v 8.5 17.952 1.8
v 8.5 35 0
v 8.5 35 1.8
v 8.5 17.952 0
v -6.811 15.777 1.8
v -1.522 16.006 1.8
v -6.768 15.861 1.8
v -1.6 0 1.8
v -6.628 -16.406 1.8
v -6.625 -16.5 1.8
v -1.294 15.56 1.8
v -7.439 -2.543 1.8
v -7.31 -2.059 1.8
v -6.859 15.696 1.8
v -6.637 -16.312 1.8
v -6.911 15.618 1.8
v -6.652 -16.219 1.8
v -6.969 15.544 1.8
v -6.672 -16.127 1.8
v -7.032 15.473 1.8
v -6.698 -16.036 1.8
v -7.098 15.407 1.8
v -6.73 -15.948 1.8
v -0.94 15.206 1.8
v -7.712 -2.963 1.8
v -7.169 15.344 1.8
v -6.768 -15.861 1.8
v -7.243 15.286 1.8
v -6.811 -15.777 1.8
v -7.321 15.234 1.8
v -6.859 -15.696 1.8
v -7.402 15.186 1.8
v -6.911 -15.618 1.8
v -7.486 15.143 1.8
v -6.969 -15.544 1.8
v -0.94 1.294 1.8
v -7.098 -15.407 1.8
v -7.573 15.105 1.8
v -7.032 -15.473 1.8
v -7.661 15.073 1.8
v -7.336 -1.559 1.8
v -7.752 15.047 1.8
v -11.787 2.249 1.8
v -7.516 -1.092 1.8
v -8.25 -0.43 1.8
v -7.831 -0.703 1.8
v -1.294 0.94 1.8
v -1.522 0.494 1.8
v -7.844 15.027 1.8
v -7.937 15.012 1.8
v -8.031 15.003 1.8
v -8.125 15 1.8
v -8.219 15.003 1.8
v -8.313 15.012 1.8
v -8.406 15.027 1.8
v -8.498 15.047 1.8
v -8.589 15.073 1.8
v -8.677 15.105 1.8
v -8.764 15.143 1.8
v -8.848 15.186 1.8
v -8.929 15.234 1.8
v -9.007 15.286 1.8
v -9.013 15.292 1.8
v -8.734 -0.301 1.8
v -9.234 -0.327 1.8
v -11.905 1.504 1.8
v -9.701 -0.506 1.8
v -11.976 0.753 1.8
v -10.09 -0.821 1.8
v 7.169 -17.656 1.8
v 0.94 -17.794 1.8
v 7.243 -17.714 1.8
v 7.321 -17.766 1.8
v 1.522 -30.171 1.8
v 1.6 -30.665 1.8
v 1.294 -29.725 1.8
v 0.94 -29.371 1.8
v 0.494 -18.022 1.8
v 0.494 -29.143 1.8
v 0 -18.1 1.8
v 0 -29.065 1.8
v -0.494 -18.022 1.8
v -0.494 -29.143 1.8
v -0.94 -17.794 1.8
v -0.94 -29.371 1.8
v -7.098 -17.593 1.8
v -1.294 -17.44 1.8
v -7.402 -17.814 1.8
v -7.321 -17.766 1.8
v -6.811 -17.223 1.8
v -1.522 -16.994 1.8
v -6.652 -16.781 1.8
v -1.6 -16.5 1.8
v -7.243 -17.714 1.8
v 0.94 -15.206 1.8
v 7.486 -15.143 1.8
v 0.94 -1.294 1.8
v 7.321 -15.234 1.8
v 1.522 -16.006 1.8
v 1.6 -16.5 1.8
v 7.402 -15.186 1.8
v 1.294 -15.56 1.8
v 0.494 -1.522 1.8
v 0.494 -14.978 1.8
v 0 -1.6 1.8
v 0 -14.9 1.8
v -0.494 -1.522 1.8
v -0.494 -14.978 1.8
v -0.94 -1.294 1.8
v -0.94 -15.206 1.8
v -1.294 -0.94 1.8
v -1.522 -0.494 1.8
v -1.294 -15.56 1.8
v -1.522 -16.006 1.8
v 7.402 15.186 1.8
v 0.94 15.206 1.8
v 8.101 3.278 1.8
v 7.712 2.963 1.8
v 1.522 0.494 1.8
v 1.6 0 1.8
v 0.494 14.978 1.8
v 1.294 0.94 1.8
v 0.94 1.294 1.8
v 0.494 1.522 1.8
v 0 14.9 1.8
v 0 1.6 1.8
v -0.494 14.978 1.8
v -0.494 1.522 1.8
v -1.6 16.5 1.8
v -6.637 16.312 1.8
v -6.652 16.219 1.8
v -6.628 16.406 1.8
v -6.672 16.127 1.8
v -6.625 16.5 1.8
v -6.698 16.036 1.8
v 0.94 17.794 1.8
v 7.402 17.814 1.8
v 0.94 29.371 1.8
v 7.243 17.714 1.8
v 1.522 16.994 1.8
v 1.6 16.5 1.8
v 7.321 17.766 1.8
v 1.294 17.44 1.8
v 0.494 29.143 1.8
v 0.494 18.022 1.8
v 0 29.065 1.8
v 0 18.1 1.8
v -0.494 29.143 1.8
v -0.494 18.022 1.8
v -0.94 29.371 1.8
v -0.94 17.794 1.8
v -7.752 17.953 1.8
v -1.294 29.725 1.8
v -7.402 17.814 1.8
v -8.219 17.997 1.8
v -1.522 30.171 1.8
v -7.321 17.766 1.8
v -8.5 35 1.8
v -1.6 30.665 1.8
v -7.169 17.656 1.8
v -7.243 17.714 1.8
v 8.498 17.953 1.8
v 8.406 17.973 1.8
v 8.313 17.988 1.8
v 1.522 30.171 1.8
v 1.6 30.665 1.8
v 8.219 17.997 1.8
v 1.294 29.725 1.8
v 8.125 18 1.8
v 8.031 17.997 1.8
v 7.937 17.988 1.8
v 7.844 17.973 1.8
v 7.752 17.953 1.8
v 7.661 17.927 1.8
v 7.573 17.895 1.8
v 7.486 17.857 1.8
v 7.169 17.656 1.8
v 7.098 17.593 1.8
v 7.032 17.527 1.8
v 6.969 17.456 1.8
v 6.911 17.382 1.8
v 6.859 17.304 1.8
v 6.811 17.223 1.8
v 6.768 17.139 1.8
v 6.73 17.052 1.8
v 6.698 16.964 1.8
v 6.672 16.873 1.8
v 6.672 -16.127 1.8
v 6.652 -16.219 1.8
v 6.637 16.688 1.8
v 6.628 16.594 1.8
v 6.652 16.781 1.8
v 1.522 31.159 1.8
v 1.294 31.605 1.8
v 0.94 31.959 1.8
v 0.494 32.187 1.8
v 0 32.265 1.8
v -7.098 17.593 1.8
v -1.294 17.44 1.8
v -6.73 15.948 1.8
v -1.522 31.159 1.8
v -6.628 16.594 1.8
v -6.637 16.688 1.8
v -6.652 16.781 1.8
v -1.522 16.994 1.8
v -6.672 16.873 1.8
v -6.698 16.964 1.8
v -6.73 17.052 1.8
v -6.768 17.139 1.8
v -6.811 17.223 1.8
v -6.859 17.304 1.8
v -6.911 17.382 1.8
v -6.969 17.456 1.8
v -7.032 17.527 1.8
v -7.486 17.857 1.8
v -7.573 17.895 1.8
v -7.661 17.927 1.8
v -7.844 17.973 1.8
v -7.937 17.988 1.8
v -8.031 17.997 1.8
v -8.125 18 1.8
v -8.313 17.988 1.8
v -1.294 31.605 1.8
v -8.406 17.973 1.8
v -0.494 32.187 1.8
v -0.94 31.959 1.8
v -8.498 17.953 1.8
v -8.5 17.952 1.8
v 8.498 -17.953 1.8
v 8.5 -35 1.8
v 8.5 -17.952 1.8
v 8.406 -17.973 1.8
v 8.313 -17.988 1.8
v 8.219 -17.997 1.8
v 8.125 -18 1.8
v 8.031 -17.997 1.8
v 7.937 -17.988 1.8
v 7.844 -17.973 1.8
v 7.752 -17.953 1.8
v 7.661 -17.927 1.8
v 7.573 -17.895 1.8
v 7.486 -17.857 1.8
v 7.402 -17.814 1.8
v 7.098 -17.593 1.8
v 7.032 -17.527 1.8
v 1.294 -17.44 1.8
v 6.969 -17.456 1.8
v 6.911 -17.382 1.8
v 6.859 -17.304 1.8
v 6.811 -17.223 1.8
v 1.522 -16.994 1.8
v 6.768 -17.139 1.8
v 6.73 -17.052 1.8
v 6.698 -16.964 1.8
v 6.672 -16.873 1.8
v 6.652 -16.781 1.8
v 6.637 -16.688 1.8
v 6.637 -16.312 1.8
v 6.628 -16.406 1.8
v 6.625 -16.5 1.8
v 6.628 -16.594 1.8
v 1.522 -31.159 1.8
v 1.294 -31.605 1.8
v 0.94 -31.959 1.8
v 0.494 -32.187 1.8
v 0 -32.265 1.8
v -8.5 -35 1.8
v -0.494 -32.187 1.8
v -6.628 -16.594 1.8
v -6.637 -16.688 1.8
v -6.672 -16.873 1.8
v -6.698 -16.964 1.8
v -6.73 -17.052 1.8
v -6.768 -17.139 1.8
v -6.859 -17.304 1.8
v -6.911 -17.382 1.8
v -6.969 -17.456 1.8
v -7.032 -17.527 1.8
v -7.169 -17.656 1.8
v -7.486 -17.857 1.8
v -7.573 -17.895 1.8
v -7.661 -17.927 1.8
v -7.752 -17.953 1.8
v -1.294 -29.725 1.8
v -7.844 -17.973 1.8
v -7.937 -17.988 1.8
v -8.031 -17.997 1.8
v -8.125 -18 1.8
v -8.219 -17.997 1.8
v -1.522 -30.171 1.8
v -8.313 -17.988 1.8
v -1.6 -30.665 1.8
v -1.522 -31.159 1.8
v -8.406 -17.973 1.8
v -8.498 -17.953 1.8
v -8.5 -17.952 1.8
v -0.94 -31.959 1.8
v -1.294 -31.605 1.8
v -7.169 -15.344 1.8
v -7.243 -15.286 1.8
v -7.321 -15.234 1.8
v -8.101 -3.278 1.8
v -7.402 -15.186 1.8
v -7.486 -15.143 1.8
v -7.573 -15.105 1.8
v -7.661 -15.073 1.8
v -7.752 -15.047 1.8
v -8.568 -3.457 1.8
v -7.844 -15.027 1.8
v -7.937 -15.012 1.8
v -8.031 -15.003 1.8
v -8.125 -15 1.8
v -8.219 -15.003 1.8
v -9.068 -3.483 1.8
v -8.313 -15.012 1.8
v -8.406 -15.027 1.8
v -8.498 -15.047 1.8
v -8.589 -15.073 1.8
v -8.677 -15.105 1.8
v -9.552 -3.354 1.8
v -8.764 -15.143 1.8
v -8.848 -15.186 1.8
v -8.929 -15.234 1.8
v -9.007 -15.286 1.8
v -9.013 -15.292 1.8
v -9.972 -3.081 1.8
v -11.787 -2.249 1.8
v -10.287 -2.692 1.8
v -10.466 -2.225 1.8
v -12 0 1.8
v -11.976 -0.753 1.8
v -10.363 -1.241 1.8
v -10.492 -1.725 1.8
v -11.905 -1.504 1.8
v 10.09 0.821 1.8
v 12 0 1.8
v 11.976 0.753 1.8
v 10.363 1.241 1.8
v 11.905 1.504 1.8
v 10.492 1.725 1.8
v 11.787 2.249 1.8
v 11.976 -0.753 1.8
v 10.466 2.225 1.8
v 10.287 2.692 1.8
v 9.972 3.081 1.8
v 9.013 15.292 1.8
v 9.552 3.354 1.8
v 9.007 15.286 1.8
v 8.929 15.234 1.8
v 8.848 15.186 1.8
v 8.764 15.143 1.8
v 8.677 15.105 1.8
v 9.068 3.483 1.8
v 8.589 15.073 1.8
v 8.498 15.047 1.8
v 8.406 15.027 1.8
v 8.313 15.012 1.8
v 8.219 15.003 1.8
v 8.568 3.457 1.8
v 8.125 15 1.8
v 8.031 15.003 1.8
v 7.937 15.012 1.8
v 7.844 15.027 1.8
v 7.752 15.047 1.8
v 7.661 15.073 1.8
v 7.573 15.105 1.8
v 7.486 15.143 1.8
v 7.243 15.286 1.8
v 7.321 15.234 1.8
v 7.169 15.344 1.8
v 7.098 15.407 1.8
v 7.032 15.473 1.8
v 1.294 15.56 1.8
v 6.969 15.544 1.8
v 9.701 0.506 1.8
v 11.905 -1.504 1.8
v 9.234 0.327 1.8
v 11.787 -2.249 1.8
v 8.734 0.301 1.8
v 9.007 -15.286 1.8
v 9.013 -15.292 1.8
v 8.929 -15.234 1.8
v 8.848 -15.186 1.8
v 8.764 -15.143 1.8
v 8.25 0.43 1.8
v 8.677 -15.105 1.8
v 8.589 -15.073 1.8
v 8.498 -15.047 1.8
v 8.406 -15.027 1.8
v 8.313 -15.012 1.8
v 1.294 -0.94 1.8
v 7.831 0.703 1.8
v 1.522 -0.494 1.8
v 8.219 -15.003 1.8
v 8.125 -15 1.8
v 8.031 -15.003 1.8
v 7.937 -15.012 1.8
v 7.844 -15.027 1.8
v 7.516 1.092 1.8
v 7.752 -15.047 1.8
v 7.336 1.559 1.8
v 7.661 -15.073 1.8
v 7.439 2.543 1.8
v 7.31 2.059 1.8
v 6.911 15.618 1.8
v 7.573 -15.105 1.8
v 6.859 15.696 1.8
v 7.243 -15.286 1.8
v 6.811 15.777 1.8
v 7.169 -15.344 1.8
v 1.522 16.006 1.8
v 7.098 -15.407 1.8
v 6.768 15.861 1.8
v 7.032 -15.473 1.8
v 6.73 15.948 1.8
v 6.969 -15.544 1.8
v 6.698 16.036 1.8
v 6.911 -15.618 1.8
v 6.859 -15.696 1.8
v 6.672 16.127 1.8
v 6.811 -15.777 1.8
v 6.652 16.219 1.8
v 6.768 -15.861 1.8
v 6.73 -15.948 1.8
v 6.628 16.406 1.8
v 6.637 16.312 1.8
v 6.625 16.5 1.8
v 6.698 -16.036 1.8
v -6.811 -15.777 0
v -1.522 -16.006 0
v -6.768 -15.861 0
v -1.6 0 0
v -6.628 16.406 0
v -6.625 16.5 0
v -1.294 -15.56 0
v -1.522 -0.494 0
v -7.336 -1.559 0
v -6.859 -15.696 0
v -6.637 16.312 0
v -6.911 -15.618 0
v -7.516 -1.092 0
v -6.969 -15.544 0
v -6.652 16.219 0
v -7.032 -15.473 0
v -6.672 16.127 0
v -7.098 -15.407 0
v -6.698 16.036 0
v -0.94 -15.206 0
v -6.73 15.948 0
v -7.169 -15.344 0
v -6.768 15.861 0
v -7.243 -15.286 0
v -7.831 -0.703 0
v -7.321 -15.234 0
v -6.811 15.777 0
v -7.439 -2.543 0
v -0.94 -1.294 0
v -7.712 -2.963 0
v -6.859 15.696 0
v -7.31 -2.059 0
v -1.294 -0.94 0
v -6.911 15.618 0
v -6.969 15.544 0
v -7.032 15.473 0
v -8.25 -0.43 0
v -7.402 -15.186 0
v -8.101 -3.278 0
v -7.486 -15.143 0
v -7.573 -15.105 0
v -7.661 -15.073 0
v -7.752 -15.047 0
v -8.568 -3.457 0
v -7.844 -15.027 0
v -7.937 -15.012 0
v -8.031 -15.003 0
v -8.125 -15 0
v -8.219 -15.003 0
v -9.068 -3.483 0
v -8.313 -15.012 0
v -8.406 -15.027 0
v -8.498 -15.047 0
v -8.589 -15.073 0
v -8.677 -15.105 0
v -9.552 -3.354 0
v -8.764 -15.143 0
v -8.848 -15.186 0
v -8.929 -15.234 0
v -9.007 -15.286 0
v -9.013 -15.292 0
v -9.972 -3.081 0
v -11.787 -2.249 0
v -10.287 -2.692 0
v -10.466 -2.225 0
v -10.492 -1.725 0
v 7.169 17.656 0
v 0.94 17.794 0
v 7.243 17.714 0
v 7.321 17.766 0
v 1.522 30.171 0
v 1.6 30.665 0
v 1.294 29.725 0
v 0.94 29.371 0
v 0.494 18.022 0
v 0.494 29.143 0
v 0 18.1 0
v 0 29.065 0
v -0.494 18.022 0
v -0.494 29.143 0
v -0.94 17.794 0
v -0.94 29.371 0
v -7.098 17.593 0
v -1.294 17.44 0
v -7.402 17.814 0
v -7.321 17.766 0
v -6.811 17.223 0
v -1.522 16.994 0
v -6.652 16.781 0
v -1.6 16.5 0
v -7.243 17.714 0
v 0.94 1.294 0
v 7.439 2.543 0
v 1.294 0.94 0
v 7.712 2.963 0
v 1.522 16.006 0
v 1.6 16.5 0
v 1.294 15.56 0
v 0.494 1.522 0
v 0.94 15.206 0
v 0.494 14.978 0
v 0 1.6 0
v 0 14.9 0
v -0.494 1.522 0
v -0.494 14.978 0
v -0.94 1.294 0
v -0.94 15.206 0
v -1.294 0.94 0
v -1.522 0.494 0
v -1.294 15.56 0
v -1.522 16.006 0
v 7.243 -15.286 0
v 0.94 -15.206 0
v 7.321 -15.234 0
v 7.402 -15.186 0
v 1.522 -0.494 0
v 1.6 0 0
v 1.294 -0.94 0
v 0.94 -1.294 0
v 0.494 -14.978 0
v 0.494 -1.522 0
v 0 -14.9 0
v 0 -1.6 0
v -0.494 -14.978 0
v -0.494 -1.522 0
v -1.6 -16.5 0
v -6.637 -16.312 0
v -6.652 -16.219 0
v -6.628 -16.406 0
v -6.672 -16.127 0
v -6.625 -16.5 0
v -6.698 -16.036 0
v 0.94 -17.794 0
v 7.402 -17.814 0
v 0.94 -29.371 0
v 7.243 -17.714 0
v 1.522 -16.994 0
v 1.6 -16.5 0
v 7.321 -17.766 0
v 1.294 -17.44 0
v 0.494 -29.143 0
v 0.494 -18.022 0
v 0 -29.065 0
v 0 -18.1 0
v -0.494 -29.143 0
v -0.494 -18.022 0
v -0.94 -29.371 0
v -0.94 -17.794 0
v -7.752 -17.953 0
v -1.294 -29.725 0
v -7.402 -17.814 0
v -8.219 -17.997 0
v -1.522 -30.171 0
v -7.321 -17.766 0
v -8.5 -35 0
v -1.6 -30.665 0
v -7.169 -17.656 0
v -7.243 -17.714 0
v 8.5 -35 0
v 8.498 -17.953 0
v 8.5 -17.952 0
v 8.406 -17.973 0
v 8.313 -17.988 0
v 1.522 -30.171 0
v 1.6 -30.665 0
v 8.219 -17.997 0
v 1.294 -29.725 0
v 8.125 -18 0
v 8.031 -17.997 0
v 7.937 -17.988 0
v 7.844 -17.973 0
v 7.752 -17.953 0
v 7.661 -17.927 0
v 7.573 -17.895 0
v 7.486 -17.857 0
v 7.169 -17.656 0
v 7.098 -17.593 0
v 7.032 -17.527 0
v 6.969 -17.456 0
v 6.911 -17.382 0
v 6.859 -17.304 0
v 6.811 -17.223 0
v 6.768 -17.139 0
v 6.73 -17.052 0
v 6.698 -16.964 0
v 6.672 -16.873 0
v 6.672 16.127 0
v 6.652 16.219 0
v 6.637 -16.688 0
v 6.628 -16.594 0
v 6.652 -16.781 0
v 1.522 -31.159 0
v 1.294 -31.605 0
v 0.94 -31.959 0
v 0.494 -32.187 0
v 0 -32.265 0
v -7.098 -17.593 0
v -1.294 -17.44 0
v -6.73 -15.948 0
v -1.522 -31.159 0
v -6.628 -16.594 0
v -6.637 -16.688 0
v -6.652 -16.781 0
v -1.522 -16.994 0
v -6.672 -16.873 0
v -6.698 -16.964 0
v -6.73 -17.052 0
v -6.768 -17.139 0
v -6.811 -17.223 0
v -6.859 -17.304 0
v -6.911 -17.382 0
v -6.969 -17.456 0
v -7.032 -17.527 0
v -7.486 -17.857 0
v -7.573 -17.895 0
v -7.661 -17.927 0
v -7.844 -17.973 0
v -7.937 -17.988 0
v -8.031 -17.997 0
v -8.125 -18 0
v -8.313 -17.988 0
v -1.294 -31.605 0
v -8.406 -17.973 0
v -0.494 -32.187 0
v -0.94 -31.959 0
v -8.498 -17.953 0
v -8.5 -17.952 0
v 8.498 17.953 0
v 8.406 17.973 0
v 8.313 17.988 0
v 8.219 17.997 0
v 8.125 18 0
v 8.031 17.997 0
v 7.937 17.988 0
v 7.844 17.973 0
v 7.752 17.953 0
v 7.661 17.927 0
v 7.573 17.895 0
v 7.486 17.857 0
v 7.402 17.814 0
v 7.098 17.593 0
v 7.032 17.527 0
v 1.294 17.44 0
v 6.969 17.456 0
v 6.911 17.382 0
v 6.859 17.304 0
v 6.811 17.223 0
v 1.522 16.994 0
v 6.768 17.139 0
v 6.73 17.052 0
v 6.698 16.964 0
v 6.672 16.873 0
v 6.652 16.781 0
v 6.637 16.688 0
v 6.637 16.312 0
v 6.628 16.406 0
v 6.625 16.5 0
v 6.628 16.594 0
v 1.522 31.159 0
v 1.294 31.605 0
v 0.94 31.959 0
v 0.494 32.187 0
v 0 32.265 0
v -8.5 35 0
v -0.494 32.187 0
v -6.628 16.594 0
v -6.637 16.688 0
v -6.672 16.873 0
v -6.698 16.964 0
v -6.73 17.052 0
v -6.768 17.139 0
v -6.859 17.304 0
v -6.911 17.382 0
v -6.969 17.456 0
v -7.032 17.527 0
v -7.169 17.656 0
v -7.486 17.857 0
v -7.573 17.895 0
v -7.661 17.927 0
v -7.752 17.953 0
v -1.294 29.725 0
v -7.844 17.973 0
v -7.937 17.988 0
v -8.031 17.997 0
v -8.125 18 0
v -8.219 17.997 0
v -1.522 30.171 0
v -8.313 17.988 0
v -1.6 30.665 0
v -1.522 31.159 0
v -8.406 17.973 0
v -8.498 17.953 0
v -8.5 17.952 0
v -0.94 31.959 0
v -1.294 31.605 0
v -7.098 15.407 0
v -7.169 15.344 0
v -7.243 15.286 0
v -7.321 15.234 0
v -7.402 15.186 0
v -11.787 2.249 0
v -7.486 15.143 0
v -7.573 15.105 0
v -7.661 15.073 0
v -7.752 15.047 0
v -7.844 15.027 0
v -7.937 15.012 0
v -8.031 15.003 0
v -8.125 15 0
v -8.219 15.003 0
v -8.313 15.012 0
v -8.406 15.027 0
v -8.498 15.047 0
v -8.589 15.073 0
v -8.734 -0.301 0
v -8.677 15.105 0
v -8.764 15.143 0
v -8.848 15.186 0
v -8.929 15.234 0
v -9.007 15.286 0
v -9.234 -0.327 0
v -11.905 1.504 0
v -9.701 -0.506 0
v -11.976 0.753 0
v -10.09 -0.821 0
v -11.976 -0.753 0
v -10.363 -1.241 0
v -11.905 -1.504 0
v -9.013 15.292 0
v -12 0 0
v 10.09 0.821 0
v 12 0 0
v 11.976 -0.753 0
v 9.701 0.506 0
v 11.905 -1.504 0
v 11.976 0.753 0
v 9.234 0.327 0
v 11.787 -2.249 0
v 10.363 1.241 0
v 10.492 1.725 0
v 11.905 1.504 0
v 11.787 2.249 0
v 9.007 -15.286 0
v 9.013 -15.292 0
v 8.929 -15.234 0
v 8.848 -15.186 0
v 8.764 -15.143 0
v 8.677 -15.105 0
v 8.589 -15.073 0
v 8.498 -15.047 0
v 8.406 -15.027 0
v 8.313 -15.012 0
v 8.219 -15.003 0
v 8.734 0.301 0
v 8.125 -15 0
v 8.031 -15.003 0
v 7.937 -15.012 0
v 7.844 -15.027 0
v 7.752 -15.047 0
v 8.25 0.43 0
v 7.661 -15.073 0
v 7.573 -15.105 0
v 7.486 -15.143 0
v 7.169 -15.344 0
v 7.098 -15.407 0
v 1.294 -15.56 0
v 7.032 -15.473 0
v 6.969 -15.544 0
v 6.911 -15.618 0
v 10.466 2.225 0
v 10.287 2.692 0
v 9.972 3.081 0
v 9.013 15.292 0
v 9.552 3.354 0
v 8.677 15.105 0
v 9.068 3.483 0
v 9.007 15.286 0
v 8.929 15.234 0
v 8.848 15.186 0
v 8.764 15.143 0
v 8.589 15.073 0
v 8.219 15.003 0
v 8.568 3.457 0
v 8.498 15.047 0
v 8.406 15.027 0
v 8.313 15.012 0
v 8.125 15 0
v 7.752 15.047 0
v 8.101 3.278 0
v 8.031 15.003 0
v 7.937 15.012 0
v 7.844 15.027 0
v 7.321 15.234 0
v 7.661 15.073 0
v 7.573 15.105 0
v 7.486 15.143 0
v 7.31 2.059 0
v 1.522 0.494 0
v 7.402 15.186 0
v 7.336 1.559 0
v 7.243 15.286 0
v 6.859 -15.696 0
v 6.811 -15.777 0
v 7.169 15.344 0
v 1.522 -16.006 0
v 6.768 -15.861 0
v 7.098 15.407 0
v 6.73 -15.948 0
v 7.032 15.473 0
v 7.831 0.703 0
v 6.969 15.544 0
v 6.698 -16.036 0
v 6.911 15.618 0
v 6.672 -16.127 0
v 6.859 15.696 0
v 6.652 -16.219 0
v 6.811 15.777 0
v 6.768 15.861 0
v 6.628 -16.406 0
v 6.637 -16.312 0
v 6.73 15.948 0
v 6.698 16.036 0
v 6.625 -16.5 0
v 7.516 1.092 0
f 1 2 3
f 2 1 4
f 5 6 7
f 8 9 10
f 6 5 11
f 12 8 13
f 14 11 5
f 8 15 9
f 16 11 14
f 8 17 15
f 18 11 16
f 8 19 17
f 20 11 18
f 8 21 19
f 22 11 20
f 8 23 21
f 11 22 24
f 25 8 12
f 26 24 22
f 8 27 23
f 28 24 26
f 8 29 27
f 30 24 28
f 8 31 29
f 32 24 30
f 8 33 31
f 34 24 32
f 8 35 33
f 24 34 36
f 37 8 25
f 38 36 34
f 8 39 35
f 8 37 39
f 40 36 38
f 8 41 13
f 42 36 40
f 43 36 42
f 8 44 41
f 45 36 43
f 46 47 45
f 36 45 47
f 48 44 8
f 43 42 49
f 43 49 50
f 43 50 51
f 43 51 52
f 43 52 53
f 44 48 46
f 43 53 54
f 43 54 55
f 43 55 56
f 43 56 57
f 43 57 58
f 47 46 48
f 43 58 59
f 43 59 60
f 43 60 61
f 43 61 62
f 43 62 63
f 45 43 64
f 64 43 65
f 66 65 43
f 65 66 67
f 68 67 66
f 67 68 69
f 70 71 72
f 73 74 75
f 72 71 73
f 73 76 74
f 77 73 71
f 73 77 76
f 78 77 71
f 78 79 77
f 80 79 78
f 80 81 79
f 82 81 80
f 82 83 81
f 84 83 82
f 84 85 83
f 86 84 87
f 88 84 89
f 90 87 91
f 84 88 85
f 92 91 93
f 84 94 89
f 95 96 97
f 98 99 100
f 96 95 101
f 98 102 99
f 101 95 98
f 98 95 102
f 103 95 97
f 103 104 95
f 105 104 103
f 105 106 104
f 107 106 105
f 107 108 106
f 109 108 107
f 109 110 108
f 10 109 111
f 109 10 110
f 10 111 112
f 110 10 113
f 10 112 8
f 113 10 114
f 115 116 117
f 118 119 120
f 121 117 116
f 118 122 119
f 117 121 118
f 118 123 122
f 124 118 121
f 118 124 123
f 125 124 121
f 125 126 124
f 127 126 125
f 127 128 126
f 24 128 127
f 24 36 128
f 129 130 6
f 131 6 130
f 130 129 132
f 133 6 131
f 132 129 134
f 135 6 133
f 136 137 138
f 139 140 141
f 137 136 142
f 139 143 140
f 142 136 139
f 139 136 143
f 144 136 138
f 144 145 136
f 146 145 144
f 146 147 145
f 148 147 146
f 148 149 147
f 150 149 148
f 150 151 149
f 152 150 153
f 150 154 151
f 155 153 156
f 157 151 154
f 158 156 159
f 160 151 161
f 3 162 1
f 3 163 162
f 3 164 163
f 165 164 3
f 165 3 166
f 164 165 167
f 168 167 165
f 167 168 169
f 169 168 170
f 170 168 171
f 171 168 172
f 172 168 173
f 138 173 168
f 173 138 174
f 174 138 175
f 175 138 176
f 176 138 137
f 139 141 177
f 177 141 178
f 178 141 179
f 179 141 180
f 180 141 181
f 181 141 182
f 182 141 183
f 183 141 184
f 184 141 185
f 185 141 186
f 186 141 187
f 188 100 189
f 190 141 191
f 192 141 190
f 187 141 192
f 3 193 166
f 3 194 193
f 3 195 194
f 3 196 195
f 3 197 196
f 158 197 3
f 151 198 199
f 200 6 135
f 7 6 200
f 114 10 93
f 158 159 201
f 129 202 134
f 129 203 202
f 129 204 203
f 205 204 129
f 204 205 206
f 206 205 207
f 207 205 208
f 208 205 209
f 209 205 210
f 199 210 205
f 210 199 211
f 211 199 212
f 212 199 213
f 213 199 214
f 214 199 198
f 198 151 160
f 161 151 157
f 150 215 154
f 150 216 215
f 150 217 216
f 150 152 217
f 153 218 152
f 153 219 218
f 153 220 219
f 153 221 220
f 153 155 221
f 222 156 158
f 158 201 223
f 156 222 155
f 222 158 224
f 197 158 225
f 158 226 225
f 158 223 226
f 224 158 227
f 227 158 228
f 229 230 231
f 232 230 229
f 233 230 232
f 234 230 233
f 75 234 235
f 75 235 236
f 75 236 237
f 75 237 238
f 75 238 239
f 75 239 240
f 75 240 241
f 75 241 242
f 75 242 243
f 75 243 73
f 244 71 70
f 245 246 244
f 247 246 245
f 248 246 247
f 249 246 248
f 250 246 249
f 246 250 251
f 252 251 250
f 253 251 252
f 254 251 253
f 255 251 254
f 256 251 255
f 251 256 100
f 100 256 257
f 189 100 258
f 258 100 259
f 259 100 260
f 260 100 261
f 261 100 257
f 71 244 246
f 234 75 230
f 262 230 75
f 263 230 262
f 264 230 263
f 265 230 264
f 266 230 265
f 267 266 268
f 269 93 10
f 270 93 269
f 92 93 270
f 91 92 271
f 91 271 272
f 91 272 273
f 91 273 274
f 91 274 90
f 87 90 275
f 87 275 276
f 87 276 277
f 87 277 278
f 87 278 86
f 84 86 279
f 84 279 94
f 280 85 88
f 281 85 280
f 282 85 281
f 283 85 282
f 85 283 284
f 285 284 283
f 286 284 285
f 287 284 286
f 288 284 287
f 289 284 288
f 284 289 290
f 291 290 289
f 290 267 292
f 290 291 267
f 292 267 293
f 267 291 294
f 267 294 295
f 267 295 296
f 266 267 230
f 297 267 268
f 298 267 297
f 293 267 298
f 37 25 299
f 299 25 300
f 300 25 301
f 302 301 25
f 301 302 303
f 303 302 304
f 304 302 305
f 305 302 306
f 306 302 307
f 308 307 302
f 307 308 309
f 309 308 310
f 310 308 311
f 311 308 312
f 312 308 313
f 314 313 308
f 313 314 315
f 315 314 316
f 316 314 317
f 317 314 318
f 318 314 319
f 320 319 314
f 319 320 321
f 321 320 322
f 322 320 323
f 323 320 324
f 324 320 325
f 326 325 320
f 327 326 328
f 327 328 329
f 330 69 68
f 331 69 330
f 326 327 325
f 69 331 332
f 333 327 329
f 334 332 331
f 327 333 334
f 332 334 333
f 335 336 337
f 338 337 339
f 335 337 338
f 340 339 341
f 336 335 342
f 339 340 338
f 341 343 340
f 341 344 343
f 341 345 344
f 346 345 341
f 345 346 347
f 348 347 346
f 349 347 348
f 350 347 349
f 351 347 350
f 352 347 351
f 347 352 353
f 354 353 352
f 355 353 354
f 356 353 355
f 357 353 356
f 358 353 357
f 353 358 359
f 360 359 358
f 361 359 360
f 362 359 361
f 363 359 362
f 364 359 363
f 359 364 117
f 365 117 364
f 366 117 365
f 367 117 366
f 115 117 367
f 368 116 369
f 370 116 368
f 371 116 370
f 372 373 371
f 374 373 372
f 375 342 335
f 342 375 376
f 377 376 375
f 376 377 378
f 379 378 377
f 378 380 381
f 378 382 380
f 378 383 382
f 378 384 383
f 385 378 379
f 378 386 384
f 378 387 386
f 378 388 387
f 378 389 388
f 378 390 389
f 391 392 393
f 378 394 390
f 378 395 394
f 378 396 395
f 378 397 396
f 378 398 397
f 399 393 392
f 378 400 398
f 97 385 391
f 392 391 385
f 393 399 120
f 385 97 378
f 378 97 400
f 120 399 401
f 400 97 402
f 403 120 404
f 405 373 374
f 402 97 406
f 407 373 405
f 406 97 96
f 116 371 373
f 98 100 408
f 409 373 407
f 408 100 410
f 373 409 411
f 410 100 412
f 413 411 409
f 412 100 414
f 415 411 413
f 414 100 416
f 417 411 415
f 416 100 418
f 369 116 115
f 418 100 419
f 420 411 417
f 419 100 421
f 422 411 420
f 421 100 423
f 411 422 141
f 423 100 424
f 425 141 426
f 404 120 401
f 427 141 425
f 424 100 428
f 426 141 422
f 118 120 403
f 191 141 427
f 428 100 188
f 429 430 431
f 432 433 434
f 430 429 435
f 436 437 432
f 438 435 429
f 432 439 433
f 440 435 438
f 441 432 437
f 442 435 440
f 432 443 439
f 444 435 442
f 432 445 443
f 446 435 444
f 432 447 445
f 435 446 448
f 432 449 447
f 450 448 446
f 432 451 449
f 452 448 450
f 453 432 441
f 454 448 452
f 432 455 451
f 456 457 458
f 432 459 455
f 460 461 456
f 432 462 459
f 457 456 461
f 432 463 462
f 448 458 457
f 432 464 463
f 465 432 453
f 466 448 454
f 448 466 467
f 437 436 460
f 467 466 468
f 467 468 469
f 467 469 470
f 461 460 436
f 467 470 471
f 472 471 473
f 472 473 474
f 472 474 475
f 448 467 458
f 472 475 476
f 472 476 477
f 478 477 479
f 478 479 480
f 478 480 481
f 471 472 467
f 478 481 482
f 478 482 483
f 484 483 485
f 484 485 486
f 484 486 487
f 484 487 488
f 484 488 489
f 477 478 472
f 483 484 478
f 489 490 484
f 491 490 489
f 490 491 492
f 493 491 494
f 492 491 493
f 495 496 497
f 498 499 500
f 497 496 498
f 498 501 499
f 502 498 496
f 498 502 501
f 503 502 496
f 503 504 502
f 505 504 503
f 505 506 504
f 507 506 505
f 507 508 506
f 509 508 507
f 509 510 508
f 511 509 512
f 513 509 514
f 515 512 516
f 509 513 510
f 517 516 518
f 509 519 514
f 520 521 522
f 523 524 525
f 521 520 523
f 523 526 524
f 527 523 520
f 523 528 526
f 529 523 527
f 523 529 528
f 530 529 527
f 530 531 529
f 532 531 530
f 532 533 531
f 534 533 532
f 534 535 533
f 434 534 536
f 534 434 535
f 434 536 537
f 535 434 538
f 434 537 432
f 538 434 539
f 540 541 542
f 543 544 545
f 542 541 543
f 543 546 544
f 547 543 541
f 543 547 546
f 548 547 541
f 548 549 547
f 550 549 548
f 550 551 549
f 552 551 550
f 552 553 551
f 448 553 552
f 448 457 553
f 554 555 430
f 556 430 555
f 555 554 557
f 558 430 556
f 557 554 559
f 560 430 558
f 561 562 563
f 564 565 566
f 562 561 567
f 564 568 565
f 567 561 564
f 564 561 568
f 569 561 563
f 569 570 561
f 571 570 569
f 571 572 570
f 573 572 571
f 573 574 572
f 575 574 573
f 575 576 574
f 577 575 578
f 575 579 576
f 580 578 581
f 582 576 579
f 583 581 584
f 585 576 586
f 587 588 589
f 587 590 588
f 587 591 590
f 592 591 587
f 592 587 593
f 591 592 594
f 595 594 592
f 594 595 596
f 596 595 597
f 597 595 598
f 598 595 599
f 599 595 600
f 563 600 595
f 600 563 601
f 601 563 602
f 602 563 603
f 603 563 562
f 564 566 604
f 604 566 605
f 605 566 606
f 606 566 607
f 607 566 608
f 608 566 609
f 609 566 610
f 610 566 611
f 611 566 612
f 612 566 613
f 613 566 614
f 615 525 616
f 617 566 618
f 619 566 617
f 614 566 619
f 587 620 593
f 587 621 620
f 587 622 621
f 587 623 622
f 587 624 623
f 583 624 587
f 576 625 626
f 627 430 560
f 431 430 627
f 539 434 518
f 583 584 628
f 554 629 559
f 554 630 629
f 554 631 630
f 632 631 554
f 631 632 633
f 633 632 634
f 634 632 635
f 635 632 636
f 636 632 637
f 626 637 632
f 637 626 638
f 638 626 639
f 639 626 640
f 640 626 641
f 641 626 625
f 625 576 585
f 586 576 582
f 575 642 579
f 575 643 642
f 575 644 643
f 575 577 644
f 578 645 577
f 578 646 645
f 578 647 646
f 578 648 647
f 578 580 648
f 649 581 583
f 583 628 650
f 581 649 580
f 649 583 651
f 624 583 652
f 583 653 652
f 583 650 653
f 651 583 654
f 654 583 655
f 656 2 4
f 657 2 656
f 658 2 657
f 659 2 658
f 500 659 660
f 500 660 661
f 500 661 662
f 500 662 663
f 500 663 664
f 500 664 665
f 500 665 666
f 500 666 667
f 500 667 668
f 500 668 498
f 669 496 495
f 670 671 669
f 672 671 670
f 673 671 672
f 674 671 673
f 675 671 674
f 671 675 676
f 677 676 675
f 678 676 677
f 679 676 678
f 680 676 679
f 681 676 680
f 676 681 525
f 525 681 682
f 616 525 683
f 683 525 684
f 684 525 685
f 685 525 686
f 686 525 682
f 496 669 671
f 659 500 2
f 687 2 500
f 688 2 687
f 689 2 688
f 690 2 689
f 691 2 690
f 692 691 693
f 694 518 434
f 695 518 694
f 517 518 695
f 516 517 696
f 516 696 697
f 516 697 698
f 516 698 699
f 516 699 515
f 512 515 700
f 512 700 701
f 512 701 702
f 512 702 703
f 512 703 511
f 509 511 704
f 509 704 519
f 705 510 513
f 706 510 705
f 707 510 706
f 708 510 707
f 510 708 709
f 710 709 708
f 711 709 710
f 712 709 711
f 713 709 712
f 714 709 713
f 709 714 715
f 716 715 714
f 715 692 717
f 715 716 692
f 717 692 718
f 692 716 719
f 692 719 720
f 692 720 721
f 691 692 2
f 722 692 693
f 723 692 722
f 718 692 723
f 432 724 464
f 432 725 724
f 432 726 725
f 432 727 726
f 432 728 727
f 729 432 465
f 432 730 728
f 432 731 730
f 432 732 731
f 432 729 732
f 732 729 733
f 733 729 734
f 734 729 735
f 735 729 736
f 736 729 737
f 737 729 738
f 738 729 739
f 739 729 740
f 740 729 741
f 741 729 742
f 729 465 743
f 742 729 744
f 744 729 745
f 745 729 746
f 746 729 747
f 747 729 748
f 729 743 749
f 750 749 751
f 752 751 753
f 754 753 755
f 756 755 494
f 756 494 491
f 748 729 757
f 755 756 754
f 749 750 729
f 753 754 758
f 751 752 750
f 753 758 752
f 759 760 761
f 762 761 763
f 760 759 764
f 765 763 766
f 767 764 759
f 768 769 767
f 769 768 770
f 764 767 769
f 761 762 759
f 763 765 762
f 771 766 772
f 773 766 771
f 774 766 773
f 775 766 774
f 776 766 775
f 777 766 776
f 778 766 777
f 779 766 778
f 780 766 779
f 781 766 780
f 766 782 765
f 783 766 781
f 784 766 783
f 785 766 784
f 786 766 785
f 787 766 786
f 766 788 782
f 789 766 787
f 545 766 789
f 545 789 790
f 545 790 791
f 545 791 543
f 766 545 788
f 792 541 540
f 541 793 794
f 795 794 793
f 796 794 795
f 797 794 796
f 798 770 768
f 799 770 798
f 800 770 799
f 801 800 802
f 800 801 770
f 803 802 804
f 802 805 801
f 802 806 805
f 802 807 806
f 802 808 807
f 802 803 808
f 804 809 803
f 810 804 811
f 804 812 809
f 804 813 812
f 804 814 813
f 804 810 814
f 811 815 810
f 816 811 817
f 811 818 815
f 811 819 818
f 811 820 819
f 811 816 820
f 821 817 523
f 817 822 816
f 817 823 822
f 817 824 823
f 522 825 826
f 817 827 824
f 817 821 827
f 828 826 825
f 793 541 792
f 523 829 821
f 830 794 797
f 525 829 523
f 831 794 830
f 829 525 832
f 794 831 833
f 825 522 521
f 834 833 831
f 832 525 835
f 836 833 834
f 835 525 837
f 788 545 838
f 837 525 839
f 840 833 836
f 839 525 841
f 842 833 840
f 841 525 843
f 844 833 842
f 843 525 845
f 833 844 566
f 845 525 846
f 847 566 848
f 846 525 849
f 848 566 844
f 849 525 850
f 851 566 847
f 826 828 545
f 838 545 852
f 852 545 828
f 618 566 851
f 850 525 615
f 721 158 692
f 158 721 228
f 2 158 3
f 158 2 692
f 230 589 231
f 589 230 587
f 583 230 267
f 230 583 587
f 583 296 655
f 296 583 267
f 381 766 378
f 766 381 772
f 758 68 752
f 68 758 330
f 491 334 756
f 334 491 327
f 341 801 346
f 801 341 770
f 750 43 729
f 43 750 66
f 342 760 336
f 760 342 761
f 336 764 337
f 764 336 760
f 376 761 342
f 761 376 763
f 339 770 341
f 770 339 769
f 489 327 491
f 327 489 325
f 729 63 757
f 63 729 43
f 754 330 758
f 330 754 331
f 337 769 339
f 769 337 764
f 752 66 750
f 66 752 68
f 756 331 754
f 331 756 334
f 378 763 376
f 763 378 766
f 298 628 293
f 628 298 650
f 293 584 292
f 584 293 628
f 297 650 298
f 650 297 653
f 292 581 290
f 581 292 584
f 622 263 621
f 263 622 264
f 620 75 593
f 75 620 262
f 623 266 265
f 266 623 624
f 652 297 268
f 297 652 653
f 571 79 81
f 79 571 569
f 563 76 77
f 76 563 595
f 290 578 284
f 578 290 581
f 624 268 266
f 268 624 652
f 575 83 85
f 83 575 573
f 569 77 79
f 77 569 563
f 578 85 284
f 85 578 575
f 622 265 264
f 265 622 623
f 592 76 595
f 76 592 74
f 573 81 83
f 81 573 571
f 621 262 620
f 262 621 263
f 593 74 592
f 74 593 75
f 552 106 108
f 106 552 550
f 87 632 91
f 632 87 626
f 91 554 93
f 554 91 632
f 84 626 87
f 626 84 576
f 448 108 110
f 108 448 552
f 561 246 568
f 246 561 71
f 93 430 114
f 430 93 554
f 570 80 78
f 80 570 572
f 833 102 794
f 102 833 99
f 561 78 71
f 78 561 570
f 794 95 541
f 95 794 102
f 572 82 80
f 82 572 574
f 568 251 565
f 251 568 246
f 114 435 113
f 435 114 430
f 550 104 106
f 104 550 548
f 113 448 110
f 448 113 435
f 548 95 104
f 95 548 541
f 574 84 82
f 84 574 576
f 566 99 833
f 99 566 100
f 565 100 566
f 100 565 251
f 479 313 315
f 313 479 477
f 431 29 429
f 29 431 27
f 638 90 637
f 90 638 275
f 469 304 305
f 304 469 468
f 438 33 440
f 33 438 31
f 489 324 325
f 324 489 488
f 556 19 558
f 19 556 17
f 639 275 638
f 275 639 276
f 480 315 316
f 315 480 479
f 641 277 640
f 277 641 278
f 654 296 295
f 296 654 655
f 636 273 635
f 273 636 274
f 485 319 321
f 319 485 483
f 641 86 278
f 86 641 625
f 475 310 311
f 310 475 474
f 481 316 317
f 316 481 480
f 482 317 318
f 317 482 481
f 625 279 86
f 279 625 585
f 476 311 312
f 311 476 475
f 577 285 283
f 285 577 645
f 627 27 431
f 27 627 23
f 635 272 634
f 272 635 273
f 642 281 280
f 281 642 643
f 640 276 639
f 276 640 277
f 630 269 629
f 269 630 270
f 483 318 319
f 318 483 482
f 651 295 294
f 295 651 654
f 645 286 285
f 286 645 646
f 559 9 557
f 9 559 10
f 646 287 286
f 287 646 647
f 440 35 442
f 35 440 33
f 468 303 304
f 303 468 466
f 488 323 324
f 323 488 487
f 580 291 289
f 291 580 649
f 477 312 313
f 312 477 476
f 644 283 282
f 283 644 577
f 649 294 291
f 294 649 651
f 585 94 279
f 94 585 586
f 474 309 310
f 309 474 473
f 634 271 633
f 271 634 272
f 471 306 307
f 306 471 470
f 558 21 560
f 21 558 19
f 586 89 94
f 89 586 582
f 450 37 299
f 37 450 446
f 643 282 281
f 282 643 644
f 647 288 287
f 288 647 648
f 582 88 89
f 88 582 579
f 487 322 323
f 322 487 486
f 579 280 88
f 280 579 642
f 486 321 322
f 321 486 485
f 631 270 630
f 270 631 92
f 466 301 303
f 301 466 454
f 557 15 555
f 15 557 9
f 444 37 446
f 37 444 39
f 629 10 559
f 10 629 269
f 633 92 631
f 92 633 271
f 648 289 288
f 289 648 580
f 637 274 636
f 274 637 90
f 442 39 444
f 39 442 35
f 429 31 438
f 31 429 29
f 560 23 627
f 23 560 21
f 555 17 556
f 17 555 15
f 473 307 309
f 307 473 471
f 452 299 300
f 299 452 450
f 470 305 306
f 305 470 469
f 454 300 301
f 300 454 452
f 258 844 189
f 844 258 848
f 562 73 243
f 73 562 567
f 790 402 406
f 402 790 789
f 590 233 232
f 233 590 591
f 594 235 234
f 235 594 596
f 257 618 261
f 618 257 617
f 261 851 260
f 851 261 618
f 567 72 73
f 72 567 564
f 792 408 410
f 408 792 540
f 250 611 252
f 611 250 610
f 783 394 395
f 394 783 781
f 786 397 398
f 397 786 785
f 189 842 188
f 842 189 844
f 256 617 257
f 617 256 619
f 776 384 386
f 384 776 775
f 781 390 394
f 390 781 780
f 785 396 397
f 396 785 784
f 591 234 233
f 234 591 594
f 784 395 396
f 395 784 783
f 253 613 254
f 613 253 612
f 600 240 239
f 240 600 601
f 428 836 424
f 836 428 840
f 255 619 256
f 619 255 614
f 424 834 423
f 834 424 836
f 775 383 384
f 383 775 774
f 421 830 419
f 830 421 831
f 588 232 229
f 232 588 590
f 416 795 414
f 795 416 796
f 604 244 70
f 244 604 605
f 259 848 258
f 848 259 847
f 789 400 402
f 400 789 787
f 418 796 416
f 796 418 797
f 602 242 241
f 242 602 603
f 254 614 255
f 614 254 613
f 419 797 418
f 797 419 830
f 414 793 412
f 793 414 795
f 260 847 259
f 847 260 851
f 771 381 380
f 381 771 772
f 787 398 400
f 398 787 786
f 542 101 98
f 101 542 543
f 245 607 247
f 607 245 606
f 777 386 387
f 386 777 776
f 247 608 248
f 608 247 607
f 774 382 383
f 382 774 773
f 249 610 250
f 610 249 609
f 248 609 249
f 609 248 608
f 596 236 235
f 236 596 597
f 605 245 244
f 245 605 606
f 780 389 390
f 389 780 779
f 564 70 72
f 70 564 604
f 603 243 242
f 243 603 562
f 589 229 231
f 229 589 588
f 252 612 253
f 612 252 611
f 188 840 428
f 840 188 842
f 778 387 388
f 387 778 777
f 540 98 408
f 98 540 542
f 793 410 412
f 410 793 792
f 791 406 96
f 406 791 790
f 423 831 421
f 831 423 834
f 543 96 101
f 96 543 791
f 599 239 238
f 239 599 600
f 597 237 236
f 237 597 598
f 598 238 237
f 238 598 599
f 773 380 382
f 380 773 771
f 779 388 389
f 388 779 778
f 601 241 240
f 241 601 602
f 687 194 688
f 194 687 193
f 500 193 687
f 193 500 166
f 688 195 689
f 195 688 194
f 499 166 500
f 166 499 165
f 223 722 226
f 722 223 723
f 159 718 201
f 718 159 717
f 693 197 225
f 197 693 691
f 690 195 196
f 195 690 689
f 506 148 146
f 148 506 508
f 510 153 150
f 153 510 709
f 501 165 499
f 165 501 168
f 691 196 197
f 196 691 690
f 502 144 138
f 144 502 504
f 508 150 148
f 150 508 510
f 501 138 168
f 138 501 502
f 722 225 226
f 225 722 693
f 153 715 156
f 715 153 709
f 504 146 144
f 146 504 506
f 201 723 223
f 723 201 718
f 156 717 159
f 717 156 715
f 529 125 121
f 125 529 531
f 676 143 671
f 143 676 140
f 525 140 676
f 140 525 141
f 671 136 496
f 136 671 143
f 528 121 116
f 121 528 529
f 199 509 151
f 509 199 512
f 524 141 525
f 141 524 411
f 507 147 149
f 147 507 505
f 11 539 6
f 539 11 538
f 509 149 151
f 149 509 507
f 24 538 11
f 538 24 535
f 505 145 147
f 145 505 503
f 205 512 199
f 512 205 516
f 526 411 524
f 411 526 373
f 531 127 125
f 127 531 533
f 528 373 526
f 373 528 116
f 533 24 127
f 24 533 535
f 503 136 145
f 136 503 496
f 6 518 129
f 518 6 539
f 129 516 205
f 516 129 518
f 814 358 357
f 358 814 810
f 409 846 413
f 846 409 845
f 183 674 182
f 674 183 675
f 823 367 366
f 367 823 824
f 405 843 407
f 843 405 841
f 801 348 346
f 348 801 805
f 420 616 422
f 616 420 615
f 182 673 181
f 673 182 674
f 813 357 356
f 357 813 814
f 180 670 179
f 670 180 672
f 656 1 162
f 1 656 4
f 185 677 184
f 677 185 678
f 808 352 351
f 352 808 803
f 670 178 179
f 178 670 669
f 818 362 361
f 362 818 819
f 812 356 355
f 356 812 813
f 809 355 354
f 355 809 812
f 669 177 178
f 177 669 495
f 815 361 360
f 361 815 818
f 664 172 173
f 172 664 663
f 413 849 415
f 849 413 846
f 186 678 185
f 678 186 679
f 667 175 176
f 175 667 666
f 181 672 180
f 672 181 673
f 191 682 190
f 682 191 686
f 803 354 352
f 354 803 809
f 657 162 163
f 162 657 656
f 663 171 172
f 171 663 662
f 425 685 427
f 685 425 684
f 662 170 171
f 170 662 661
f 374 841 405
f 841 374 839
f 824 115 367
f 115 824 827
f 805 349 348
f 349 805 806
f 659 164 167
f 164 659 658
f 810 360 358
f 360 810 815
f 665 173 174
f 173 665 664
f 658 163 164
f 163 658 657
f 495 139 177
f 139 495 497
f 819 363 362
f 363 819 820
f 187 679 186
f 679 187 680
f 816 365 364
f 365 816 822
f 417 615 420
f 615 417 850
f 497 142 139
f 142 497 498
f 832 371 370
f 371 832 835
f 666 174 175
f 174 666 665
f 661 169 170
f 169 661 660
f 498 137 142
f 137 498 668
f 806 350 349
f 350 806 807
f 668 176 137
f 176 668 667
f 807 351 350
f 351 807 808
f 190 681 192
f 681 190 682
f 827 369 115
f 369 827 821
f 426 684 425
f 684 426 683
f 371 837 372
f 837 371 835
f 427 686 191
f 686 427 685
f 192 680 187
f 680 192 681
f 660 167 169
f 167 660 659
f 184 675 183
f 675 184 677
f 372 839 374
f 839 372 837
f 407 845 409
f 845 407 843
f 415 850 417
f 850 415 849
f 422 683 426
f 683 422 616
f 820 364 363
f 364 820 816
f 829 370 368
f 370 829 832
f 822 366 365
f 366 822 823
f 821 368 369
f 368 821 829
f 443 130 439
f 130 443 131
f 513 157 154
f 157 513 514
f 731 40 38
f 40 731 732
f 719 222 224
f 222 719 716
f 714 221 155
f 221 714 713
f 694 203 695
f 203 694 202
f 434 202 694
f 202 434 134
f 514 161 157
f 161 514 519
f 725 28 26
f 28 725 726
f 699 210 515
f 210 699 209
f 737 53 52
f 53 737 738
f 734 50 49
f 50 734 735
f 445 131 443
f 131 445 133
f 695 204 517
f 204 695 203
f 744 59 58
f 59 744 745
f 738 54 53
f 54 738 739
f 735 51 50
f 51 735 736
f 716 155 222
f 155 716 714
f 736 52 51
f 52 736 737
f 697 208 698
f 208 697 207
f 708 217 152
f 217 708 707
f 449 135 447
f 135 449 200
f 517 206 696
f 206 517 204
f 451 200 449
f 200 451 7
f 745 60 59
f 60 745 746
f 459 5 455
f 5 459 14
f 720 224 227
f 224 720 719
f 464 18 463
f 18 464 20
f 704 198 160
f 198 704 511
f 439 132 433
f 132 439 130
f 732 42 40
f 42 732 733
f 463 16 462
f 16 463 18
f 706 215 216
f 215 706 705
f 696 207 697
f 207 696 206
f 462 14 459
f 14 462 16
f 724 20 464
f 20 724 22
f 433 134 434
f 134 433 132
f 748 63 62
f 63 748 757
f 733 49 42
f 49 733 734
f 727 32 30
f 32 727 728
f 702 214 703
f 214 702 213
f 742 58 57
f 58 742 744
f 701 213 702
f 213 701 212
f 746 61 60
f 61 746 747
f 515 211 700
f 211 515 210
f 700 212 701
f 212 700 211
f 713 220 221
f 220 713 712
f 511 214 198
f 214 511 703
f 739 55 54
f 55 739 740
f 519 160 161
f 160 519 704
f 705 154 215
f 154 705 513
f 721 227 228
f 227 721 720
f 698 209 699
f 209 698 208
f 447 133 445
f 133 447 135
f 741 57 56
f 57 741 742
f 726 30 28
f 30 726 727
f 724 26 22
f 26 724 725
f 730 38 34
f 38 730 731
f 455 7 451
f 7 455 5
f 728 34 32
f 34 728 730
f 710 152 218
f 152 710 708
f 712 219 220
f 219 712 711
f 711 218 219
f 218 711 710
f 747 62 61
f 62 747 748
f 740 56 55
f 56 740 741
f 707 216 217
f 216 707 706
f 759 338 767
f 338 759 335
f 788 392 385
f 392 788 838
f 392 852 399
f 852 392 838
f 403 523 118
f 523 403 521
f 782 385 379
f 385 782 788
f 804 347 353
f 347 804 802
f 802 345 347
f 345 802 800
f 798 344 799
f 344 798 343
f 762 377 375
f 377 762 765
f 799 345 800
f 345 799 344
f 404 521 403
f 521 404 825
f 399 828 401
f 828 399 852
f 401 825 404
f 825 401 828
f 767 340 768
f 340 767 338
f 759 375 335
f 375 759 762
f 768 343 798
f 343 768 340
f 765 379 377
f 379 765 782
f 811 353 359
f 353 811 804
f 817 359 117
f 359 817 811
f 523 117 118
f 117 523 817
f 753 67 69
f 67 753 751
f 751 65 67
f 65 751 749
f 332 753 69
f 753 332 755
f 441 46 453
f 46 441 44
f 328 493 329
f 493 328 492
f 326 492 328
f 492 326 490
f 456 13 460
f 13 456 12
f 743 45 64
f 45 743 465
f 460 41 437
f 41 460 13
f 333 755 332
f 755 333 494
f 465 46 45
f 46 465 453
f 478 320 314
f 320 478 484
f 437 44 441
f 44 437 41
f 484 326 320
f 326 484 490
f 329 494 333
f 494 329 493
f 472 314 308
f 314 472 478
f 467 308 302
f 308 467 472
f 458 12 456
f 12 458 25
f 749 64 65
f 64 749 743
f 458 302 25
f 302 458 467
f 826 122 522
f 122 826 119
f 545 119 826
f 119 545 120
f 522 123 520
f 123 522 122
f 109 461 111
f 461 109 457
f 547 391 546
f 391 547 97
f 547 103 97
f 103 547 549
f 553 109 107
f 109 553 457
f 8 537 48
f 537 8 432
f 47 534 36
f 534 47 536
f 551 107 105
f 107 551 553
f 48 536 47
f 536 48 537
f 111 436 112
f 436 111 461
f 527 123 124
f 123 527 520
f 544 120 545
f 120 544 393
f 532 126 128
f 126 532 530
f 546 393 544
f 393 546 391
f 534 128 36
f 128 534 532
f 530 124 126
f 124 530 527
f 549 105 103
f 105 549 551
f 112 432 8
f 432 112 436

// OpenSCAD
// file: ../parameters.scad
week = "77";
global_clearance = 0.5;

layer_thickness = 0.3;

base_patern = 10;

//Main tube diameter - hole [mm]
main_tube_outer_diameter = 25.4;
main_tube_inner_diameter = 23.05;

// Nastavení parametrů rotoru

gliding_aggle = 14;         // tenhle úhel by se zřejmě v budoucnu měl počítat z požadované klouzavosti.

rotor_blade_AOA = 1.5;      // nastavení úhlu náběhu rotorového listu

// Rotor Auto-G2
rotor_blade_rod = true;  // generovat diru pro uhlikove tycky
rotor_blade_length = 500;   // délka rotorového listu
// rotor_blade_length = 450 - 15;   // délka rotorového listu -- nastaveni prvniho vytisku
//rotor_blade_length = 460;   // délka rotorového listu
rotor_blade_depth = 45.5+2;     // hloubka rotorového listu
rotor_balde_tip_cutoff = 15.5;


blade_mount_length = 30;

blade_mount_width = 17;
blade_mount_thickness = 4.6;
blade_mount_screw_offset = 5; // distance of first screw from rotor end

// Testovaci maly rotor

        /*
        rotor_blade_rod = false;
        rotor_blade_length = 145;   // délka rotorového listu
        rotor_blade_depth = 45.5 * (145/385);     // hloubka rotorového listu
        blade_mount_length = 20;
        blade_mount_width = 10;
        blade_mount_thickness = 4;
        */

// konec parametru pro testovaci maly rotor

rotor_height = 180;         // výška otočného kloubu rotoru nad hlavní trubkou vírníku (odhad)
rotor_blades_count = 2;
rotor_delta_angle = 12;
rotor_blade_thickness = 5.1;
//rotor_balde_tip_cutoff = 10;

rotor_blade_naca = 2412;
rotor_blade_parts_count = 4;
//rotor_blade_parts_count = 3;

blade_transition_length = 10; // length of blade transition

blade_mount_screw_distance = (16.47+11.86)/2;

rod_from_end = 10;

/* blade_shell_thickness = 0.4;
blade_shell_thickness_inner = 0.4;
blade_shell_thickness_wire = 0.4;
blade_infill_distance = 25;
blade_infill_overlap = 0; */

/// Nastaveni pro Slic3r
blade_shell_thickness = 0.45;
blade_shell_thickness_inner = 0.2;
blade_shell_thickness_wire = 0.45;
blade_infill_distance = 23;
blade_infill_overlap = 0;


//blade_rod_position = [rotor_blade_depth/4 + 5, 0, 0];
//blade_rod_position2 = [rotor_blade_depth/4 - 5, 0, 0];

//blade_rod_position = [15, 0, 0];
//blade_rod_position2 = [4, 0.3, 0];

//blade_rod1_diameter = 2.58;
//blade_rod2_diameter = 2.58;
//blade_rod3_diameter = 2.13;
blade_rod1_diameter = 2.55;
blade_rod2_diameter = 2.55;
blade_rod3_diameter = 2.55;

// blade_rod1_position = [3.4, 0.3, 0];
blade_rod1_position = [rotor_blade_depth/4 - 8.7, 0.2, 0];
blade_rod2_position = [rotor_blade_depth/4 - 5.8, 0.5, 0];
blade_rod3_position = [rotor_blade_depth/4 + 3.5, 0.5, 0];


blade_glue_holes = 0;

rotor_blade_endtip_diameter = 20;

rotor_blade_part_list = [0, 50, 200, 350, 500];

// vzdalenosti der pro kryty
cover_holes = [base_patern*5, base_patern*13, base_patern*17, base_patern*26];



rotor_head_width =  30;    //Rozměr 1 v nákresu
pylon_wall_thickness = 4.2;  // Rozměr 2 v nákresu
horizontal_screw_distance = 14.5;   // Rozměr 4 v nákresu
vertical_screw_distance = 12;       // rozměr 5 v nkresu
topscrew_distance_endofpylon = 5;

rotorhead_wall_thickness = 3; // sila tistenych dilu


bearing_outer_diameter = 10.2;    // Rozměr B1 v nákresu s přídavkem na toleranci otvoru
bearing_thickness = 4;        // Rozměr B2 v nákresu
//bearing_shaft_length = 19.5;    // Rozměr B3 v nákresu, Originalni hodnota 19.5
bearing_shaft_length = 20;    // Rozměr B3 v nákresu


// nastavení parametrů motoru

engine_angle = -8;
engine_diameter = 55;
engine_offset = 55;

engine_screws_radius = 15;
engine_holes_radius = (24 + 44)/4;
engine_shatf_hole_diameter = 13;

// screw length step - minimum difference in length between two types of screws
basic_screw_length = 5;

//Screw diameter and nut for M6 [mm]
M6_screw_diameter=6.5;
M6_head_diameter = 10+0.5;
M6_head_height = 6;
M6_nut_height = 4.9;
M6_nut_diameter = 11.8;
M6_nut_pocket = 10.4;

//Screw diameter and nut for M5 [mm]
M5_screw_diameter=5.5;
M5_head_height = 5;
M5_head_diameter = 13+0.5;
M5_nut_height = 4.5;
M5_nut_diameter = 9.4;
M5_nut_pocket = 8.4;

//Screw diameter and nut for M4 [mm]
M4_screw_diameter=4.5;
M4_screw_head_height = 4;
M4_nut_height = 3.2;
M4_nut_diameter = 8.4;
M4_nut_pocket = 7.5;

//Screw diameter and nut for M3 [mm]
M3_screw_diameter = 3.2;
M3_nut_height = 2.7;
M3_nut_diameter = 6.6;
M3_screw_head_height = 3;
M3_nut_pocket = 5.6;


//Screw diameter and nut for M2,5 [mm]
M2_5_screw_diameter = 2.7;
M2_5_nut_height = 2.3;
M2_5_nut_diameter = 6;
M2_5_nut_pocket = 5.1;

//Screw diameter and nut for M2 [mm]
M2_screw_diameter = 2.0;
M2_nut_height = 1.8;
M2_nut_diameter = 4.8;
M2_nut_pocket = 3.95;


blade_mount_screw = M3_screw_diameter;
blade_mount_nut = M3_nut_diameter;


//šroub servo
Servo_screw = 1.5;
Servo_nut_height = 1;
Servo_nut_diameter = 2.7;

tail_pipes_distance = 10.16*5;
tail_pipes_diameter = M4_screw_diameter;
tail_pipes_min_wall = 3;

elevator_pitch = 2;


/// ruder parametry

rudder_height = 150;
height_bottom_part = 130;
rudder_depth_max = 200;

below_rudder_height = 30;
rudder_depth = 60;

tail_airfoil_n = 80;




//center_of_gravity_position = [main_pylon_position - tan(gliding_aggle)*rotor_height, 0, 0];


////podzvozek

radius_undercarriage = 25;
vzdalenost_x = tan(20) * 131;
vzdalenost_y = (131 - radius_undercarriage)/tan(79);
uhel_y = 90 - 20;
uhel_x = 90 - 79;

maximum_printable_size = 150;


////Pitotova trubice
Pitot_tube_diameter = 4.02 + 1;
Distance_hole_from_tube = 11.92;  //vzdálenost otvoru pro připevnění od samotné trubičky


////Vlečné zařízení
tow_ring_diameter = 20;
tow_ring_thickness = 5;
tow_ring_groove = 2;
tow_ring_hole_diameter = M3_screw_diameter;

////Simoniny parametry pro nosník rotoru
base_length = 290; //delka podlozky
base_split_position = [0, 290/2, base_length];
base_width = 70; //sirka podlozky - vnější šířka nosníku
base_thickness = 3; //vyska podlozky
rantl_thickness = 3; //sirka steny podlozky
rantl_height = 6.5;
niy=4; //pocet der podelne


// Drazak motoru

motor_holder_height = base_patern * 5;
motor_holder_thickness = 3.5;
motor_holder_motor_height = 25;
motor_holder_side_mount_height = base_patern*2.5;
pylon_holder_side_mount_height = base_patern*4.5;


// Paraetry pylonu


// pylon_height = 250 - pylon_holder_side_mount_height;
pylon_height = 180 + 50 - pylon_holder_side_mount_height;
pilot_height_separation = 120 + 30 - pylon_holder_side_mount_height;
pylon_thickness = 3;
pylon_beam_width = 10;
pylon_base_length = 60;
pylon_ring_length = 40;
pylon_ring_thickness = 3;

pylon_top_width = 20;
pylon_top_length = 20;

pylon_ring_width = 45;
pylon_ring_height_rantl = 12+0.5;
pylon_ring_height = 3;

pylon_angle = atan2(pylon_height,(base_width-pylon_top_width)/2);
echo(pylon_angle);

pylon_bottom_angle = atan2(pilot_height_separation,(base_width-pylon_ring_width)/2-pylon_thickness*1.5);
echo(pylon_bottom_angle);
pylon_top_angle = atan2(pylon_height - pilot_height_separation,(pylon_ring_width - rotor_head_width)/2 - pylon_thickness - pylon_ring_thickness);
echo(pylon_top_angle);
// main file
//
//
//

include <../parameters.scad>

module 888_4002(hole_diameter=3)
{
    angle_between_blades = 360 / rotor_blades_count;
    shaft_diameter = M3_screw_diameter;
    thickness = 1.8;
    blade_screws_distance = (16.47+11.86)/2;
    blade_holder_widh = blade_mount_width;

    translate([0, 0, thickness/2])
    difference () {
        union () {
          hull(){
            cylinder(r = 3+9, h = thickness, center = true, $fn = 100);
            for (i = [0:rotor_blades_count]){
                rotate([0,0, i*angle_between_blades])
                    translate([0, blade_screws_distance, 0])
                        cube([blade_holder_widh, blade_screws_distance/2, thickness], center = true);
            }
          }



            for (i = [0:rotor_blades_count]){
                rotate([0,0, i*angle_between_blades])
                    translate([0, 20, 0])
                        cube([blade_holder_widh, 30, thickness], center = true);
            }
        }

        cylinder(d = shaft_diameter, h = 2* thickness, center = true, $fn = 20);


        for (i = [1:rotor_blades_count]){
            rotate([0,0, i*angle_between_blades])
                translate([0, 16.5 + blade_screws_distance/2, 0]) {
                    translate([0, blade_screws_distance/2, 0])
                        cylinder(d = blade_mount_screw, h = 2* thickness, center = true, $fn = 20);
                    translate([0, -blade_screws_distance/2, 0])
                        cylinder(d = blade_mount_screw, h = 2* thickness, center = true, $fn = 20);

                    //diry pro lepsi moznost utrzeni listu
                    translate ([blade_holder_widh/2 - hole_diameter/8, -blade_screws_distance/2, 0])
                        cylinder (h=thickness*2, d=hole_diameter, center=true, $fn=100);

                    translate ([-blade_holder_widh/2 + hole_diameter/8, -blade_screws_distance/2, 0])
                        cylinder (h=thickness*2, d=hole_diameter, center=true, $fn=100);


                }
        }

        rotate([0,0, rotor_delta_angle])
        for (i = [1:rotor_blades_count]){
            rotate([0,0, i*angle_between_blades + angle_between_blades/2])
                translate([0, 3 + 4.5 + blade_mount_screw/2, 0])
                    cylinder(d = blade_mount_screw, h = 2* thickness, center = true, $fn = 20);
        }
    }
}

888_4002();
